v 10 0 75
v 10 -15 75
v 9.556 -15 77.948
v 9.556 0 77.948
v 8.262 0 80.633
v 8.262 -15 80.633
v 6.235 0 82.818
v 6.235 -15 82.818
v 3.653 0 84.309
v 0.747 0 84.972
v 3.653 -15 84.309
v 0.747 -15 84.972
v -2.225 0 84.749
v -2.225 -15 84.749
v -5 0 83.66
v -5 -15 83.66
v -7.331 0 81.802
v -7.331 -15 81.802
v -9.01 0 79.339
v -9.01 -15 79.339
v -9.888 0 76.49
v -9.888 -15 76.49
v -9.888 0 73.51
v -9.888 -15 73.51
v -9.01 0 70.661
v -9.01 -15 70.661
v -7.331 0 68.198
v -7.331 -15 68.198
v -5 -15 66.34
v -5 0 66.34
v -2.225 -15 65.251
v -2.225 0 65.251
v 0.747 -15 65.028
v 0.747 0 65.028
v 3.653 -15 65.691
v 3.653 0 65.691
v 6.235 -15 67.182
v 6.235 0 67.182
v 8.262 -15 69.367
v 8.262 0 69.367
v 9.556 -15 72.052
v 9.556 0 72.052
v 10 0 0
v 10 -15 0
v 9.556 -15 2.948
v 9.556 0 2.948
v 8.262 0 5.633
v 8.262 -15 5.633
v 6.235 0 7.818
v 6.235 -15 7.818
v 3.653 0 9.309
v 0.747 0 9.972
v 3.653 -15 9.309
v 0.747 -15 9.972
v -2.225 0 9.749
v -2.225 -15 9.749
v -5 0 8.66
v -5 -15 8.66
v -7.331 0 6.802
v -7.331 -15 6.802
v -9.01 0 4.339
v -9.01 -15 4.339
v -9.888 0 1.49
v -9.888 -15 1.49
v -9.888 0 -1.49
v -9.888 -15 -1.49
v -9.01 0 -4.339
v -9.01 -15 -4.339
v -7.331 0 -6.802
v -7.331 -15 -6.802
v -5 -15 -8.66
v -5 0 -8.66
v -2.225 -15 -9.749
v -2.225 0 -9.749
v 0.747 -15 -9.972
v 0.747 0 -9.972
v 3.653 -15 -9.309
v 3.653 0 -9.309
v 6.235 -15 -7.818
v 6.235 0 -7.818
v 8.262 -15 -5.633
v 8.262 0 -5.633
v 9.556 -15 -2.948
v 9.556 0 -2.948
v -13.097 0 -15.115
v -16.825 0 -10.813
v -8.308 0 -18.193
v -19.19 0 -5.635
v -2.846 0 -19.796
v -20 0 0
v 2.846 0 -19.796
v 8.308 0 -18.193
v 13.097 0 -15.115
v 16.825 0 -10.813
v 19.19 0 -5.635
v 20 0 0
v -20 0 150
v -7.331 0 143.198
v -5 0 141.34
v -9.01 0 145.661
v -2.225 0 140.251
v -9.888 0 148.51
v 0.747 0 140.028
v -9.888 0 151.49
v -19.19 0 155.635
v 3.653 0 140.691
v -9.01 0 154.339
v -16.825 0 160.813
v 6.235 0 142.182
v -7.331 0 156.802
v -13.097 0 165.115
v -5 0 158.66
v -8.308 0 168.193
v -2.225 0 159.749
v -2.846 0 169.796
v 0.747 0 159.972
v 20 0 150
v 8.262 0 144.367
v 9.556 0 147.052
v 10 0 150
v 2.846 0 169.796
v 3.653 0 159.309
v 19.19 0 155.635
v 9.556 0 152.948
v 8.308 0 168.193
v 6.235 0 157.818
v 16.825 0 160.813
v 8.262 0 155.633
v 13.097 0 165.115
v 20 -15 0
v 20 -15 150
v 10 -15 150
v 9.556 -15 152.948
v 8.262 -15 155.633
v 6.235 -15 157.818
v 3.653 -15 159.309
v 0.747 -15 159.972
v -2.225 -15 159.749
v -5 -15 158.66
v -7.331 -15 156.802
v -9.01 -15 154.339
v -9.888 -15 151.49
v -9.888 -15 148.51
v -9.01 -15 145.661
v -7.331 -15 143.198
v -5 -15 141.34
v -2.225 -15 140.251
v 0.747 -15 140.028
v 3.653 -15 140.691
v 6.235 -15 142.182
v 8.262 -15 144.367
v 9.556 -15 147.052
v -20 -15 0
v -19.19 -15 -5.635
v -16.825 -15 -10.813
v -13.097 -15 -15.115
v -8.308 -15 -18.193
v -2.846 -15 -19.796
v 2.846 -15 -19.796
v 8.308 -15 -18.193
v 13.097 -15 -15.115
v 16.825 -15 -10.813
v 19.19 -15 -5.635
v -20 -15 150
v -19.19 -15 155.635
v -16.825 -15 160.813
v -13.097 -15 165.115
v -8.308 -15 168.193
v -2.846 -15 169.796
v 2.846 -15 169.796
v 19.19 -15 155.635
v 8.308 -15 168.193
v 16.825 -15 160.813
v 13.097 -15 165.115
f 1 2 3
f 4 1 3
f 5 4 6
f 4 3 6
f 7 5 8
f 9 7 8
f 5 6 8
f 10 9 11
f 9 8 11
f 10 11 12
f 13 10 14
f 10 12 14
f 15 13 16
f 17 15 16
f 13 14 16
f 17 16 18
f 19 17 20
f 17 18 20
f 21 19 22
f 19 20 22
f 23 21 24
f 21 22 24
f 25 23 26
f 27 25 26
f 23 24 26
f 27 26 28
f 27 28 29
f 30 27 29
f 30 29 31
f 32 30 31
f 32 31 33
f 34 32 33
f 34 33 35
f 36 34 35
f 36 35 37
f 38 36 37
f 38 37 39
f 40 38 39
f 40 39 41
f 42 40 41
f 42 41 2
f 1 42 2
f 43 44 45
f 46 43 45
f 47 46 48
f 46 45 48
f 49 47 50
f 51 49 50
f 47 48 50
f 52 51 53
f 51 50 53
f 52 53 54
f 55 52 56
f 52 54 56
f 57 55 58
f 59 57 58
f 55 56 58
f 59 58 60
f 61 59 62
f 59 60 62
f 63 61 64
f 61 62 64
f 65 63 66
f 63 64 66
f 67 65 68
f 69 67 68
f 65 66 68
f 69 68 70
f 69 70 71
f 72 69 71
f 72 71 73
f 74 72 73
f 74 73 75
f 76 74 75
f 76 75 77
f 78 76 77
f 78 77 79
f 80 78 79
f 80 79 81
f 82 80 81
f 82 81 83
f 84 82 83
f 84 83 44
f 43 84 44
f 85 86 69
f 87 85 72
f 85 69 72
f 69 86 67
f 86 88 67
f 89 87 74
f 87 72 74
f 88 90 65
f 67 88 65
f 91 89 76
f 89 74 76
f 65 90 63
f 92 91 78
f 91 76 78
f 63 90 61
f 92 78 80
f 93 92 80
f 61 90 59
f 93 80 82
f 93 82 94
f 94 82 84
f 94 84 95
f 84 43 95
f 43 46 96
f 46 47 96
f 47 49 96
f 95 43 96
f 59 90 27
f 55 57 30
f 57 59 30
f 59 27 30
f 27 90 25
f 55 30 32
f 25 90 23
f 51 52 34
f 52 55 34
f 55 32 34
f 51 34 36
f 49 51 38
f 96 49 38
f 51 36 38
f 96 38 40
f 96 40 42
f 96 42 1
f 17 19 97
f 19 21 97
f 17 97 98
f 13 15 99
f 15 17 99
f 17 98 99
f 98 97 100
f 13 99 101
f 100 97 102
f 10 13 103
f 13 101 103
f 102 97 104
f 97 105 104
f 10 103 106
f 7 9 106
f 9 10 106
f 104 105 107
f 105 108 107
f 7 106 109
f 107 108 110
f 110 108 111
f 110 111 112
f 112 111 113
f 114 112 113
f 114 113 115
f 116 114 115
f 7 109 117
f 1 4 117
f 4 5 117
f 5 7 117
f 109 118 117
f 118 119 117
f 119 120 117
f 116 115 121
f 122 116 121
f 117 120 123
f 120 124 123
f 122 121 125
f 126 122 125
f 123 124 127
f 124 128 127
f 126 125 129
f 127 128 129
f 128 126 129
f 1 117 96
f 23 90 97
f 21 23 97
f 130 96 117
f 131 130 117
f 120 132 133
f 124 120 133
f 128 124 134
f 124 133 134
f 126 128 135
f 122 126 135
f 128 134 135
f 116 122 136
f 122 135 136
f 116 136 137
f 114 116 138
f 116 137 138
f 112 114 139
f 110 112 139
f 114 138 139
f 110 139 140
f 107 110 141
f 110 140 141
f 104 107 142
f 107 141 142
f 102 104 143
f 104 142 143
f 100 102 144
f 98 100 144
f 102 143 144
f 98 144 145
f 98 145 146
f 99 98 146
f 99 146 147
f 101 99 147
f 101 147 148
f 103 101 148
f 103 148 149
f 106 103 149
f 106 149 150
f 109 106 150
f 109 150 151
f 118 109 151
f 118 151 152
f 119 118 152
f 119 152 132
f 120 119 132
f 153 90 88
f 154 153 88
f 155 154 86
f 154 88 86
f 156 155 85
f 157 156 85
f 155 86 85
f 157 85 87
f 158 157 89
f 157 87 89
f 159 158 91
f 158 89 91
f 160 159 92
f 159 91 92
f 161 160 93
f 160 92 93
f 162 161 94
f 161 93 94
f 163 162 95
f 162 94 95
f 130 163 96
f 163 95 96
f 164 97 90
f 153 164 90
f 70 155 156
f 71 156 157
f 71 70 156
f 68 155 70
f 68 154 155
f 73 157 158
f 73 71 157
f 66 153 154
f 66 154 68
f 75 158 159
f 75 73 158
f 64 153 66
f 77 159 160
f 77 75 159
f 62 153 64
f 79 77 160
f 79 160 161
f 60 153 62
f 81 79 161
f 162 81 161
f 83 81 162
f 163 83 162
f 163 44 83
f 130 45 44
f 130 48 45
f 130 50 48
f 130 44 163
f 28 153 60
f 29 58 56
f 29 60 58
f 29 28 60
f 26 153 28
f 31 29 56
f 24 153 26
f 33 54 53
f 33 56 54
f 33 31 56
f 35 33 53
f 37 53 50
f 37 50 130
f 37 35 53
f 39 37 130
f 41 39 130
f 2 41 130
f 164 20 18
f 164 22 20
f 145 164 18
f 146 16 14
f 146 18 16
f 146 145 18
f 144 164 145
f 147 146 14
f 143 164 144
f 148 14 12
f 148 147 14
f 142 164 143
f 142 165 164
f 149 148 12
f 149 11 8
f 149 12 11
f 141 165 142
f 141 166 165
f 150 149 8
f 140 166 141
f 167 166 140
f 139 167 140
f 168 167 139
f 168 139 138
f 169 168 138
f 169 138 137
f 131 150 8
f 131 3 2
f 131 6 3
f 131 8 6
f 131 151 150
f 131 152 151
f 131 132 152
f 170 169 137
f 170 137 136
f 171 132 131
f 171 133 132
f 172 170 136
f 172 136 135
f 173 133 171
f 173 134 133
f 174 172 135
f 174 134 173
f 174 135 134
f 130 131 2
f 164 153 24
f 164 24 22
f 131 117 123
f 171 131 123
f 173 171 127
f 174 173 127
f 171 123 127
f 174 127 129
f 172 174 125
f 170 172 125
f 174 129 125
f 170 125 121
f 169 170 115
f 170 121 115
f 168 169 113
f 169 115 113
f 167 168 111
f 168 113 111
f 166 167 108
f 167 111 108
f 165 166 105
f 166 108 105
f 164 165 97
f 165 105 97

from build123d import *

# Parameters (mm, degrees)
F1_DEPTH = 15
F2_R     = 10
F3_DEPTH = 25
F4_R     = 10
F5_DEPTH = 25


with BuildPart() as f1:
    # F0 (on Front) → F1 (new body)
    with BuildSketch(Plane.XZ):
        with BuildLine():
            ThreePointArc((-20, 0), (0, -20), (20, 0))
            ThreePointArc((20, 0), (0, 20), (-20, 0))
        make_face()
        with BuildLine():
            ThreePointArc((-20, 0), (0, 20), (20, 0))
            Line((20, 0), (20, 150))
            ThreePointArc((20, 150), (0, 130), (-20, 150))
            Line((-20, 150), (-20, 0))
        make_face()
        with BuildLine():
            ThreePointArc((-20, 150), (0, 130), (20, 150))
            ThreePointArc((20, 150), (0, 170), (-20, 150))
        make_face()
    extrude(amount=F1_DEPTH)

    # F2 (on face) → F3 (cut)
    with BuildSketch(Plane.XZ.offset(15)):
        with Locations((0, 150)):
            Circle(F2_R)
        Circle(F2_R)
    extrude(amount=-F3_DEPTH, mode=Mode.SUBTRACT)

    # F4 (on face) → F5 (cut)
    with BuildSketch(Plane.XZ.offset(15)):
        with Locations((0, 75)):
            Circle(F4_R)
    extrude(amount=-F5_DEPTH, mode=Mode.SUBTRACT)


solid = f1.part
